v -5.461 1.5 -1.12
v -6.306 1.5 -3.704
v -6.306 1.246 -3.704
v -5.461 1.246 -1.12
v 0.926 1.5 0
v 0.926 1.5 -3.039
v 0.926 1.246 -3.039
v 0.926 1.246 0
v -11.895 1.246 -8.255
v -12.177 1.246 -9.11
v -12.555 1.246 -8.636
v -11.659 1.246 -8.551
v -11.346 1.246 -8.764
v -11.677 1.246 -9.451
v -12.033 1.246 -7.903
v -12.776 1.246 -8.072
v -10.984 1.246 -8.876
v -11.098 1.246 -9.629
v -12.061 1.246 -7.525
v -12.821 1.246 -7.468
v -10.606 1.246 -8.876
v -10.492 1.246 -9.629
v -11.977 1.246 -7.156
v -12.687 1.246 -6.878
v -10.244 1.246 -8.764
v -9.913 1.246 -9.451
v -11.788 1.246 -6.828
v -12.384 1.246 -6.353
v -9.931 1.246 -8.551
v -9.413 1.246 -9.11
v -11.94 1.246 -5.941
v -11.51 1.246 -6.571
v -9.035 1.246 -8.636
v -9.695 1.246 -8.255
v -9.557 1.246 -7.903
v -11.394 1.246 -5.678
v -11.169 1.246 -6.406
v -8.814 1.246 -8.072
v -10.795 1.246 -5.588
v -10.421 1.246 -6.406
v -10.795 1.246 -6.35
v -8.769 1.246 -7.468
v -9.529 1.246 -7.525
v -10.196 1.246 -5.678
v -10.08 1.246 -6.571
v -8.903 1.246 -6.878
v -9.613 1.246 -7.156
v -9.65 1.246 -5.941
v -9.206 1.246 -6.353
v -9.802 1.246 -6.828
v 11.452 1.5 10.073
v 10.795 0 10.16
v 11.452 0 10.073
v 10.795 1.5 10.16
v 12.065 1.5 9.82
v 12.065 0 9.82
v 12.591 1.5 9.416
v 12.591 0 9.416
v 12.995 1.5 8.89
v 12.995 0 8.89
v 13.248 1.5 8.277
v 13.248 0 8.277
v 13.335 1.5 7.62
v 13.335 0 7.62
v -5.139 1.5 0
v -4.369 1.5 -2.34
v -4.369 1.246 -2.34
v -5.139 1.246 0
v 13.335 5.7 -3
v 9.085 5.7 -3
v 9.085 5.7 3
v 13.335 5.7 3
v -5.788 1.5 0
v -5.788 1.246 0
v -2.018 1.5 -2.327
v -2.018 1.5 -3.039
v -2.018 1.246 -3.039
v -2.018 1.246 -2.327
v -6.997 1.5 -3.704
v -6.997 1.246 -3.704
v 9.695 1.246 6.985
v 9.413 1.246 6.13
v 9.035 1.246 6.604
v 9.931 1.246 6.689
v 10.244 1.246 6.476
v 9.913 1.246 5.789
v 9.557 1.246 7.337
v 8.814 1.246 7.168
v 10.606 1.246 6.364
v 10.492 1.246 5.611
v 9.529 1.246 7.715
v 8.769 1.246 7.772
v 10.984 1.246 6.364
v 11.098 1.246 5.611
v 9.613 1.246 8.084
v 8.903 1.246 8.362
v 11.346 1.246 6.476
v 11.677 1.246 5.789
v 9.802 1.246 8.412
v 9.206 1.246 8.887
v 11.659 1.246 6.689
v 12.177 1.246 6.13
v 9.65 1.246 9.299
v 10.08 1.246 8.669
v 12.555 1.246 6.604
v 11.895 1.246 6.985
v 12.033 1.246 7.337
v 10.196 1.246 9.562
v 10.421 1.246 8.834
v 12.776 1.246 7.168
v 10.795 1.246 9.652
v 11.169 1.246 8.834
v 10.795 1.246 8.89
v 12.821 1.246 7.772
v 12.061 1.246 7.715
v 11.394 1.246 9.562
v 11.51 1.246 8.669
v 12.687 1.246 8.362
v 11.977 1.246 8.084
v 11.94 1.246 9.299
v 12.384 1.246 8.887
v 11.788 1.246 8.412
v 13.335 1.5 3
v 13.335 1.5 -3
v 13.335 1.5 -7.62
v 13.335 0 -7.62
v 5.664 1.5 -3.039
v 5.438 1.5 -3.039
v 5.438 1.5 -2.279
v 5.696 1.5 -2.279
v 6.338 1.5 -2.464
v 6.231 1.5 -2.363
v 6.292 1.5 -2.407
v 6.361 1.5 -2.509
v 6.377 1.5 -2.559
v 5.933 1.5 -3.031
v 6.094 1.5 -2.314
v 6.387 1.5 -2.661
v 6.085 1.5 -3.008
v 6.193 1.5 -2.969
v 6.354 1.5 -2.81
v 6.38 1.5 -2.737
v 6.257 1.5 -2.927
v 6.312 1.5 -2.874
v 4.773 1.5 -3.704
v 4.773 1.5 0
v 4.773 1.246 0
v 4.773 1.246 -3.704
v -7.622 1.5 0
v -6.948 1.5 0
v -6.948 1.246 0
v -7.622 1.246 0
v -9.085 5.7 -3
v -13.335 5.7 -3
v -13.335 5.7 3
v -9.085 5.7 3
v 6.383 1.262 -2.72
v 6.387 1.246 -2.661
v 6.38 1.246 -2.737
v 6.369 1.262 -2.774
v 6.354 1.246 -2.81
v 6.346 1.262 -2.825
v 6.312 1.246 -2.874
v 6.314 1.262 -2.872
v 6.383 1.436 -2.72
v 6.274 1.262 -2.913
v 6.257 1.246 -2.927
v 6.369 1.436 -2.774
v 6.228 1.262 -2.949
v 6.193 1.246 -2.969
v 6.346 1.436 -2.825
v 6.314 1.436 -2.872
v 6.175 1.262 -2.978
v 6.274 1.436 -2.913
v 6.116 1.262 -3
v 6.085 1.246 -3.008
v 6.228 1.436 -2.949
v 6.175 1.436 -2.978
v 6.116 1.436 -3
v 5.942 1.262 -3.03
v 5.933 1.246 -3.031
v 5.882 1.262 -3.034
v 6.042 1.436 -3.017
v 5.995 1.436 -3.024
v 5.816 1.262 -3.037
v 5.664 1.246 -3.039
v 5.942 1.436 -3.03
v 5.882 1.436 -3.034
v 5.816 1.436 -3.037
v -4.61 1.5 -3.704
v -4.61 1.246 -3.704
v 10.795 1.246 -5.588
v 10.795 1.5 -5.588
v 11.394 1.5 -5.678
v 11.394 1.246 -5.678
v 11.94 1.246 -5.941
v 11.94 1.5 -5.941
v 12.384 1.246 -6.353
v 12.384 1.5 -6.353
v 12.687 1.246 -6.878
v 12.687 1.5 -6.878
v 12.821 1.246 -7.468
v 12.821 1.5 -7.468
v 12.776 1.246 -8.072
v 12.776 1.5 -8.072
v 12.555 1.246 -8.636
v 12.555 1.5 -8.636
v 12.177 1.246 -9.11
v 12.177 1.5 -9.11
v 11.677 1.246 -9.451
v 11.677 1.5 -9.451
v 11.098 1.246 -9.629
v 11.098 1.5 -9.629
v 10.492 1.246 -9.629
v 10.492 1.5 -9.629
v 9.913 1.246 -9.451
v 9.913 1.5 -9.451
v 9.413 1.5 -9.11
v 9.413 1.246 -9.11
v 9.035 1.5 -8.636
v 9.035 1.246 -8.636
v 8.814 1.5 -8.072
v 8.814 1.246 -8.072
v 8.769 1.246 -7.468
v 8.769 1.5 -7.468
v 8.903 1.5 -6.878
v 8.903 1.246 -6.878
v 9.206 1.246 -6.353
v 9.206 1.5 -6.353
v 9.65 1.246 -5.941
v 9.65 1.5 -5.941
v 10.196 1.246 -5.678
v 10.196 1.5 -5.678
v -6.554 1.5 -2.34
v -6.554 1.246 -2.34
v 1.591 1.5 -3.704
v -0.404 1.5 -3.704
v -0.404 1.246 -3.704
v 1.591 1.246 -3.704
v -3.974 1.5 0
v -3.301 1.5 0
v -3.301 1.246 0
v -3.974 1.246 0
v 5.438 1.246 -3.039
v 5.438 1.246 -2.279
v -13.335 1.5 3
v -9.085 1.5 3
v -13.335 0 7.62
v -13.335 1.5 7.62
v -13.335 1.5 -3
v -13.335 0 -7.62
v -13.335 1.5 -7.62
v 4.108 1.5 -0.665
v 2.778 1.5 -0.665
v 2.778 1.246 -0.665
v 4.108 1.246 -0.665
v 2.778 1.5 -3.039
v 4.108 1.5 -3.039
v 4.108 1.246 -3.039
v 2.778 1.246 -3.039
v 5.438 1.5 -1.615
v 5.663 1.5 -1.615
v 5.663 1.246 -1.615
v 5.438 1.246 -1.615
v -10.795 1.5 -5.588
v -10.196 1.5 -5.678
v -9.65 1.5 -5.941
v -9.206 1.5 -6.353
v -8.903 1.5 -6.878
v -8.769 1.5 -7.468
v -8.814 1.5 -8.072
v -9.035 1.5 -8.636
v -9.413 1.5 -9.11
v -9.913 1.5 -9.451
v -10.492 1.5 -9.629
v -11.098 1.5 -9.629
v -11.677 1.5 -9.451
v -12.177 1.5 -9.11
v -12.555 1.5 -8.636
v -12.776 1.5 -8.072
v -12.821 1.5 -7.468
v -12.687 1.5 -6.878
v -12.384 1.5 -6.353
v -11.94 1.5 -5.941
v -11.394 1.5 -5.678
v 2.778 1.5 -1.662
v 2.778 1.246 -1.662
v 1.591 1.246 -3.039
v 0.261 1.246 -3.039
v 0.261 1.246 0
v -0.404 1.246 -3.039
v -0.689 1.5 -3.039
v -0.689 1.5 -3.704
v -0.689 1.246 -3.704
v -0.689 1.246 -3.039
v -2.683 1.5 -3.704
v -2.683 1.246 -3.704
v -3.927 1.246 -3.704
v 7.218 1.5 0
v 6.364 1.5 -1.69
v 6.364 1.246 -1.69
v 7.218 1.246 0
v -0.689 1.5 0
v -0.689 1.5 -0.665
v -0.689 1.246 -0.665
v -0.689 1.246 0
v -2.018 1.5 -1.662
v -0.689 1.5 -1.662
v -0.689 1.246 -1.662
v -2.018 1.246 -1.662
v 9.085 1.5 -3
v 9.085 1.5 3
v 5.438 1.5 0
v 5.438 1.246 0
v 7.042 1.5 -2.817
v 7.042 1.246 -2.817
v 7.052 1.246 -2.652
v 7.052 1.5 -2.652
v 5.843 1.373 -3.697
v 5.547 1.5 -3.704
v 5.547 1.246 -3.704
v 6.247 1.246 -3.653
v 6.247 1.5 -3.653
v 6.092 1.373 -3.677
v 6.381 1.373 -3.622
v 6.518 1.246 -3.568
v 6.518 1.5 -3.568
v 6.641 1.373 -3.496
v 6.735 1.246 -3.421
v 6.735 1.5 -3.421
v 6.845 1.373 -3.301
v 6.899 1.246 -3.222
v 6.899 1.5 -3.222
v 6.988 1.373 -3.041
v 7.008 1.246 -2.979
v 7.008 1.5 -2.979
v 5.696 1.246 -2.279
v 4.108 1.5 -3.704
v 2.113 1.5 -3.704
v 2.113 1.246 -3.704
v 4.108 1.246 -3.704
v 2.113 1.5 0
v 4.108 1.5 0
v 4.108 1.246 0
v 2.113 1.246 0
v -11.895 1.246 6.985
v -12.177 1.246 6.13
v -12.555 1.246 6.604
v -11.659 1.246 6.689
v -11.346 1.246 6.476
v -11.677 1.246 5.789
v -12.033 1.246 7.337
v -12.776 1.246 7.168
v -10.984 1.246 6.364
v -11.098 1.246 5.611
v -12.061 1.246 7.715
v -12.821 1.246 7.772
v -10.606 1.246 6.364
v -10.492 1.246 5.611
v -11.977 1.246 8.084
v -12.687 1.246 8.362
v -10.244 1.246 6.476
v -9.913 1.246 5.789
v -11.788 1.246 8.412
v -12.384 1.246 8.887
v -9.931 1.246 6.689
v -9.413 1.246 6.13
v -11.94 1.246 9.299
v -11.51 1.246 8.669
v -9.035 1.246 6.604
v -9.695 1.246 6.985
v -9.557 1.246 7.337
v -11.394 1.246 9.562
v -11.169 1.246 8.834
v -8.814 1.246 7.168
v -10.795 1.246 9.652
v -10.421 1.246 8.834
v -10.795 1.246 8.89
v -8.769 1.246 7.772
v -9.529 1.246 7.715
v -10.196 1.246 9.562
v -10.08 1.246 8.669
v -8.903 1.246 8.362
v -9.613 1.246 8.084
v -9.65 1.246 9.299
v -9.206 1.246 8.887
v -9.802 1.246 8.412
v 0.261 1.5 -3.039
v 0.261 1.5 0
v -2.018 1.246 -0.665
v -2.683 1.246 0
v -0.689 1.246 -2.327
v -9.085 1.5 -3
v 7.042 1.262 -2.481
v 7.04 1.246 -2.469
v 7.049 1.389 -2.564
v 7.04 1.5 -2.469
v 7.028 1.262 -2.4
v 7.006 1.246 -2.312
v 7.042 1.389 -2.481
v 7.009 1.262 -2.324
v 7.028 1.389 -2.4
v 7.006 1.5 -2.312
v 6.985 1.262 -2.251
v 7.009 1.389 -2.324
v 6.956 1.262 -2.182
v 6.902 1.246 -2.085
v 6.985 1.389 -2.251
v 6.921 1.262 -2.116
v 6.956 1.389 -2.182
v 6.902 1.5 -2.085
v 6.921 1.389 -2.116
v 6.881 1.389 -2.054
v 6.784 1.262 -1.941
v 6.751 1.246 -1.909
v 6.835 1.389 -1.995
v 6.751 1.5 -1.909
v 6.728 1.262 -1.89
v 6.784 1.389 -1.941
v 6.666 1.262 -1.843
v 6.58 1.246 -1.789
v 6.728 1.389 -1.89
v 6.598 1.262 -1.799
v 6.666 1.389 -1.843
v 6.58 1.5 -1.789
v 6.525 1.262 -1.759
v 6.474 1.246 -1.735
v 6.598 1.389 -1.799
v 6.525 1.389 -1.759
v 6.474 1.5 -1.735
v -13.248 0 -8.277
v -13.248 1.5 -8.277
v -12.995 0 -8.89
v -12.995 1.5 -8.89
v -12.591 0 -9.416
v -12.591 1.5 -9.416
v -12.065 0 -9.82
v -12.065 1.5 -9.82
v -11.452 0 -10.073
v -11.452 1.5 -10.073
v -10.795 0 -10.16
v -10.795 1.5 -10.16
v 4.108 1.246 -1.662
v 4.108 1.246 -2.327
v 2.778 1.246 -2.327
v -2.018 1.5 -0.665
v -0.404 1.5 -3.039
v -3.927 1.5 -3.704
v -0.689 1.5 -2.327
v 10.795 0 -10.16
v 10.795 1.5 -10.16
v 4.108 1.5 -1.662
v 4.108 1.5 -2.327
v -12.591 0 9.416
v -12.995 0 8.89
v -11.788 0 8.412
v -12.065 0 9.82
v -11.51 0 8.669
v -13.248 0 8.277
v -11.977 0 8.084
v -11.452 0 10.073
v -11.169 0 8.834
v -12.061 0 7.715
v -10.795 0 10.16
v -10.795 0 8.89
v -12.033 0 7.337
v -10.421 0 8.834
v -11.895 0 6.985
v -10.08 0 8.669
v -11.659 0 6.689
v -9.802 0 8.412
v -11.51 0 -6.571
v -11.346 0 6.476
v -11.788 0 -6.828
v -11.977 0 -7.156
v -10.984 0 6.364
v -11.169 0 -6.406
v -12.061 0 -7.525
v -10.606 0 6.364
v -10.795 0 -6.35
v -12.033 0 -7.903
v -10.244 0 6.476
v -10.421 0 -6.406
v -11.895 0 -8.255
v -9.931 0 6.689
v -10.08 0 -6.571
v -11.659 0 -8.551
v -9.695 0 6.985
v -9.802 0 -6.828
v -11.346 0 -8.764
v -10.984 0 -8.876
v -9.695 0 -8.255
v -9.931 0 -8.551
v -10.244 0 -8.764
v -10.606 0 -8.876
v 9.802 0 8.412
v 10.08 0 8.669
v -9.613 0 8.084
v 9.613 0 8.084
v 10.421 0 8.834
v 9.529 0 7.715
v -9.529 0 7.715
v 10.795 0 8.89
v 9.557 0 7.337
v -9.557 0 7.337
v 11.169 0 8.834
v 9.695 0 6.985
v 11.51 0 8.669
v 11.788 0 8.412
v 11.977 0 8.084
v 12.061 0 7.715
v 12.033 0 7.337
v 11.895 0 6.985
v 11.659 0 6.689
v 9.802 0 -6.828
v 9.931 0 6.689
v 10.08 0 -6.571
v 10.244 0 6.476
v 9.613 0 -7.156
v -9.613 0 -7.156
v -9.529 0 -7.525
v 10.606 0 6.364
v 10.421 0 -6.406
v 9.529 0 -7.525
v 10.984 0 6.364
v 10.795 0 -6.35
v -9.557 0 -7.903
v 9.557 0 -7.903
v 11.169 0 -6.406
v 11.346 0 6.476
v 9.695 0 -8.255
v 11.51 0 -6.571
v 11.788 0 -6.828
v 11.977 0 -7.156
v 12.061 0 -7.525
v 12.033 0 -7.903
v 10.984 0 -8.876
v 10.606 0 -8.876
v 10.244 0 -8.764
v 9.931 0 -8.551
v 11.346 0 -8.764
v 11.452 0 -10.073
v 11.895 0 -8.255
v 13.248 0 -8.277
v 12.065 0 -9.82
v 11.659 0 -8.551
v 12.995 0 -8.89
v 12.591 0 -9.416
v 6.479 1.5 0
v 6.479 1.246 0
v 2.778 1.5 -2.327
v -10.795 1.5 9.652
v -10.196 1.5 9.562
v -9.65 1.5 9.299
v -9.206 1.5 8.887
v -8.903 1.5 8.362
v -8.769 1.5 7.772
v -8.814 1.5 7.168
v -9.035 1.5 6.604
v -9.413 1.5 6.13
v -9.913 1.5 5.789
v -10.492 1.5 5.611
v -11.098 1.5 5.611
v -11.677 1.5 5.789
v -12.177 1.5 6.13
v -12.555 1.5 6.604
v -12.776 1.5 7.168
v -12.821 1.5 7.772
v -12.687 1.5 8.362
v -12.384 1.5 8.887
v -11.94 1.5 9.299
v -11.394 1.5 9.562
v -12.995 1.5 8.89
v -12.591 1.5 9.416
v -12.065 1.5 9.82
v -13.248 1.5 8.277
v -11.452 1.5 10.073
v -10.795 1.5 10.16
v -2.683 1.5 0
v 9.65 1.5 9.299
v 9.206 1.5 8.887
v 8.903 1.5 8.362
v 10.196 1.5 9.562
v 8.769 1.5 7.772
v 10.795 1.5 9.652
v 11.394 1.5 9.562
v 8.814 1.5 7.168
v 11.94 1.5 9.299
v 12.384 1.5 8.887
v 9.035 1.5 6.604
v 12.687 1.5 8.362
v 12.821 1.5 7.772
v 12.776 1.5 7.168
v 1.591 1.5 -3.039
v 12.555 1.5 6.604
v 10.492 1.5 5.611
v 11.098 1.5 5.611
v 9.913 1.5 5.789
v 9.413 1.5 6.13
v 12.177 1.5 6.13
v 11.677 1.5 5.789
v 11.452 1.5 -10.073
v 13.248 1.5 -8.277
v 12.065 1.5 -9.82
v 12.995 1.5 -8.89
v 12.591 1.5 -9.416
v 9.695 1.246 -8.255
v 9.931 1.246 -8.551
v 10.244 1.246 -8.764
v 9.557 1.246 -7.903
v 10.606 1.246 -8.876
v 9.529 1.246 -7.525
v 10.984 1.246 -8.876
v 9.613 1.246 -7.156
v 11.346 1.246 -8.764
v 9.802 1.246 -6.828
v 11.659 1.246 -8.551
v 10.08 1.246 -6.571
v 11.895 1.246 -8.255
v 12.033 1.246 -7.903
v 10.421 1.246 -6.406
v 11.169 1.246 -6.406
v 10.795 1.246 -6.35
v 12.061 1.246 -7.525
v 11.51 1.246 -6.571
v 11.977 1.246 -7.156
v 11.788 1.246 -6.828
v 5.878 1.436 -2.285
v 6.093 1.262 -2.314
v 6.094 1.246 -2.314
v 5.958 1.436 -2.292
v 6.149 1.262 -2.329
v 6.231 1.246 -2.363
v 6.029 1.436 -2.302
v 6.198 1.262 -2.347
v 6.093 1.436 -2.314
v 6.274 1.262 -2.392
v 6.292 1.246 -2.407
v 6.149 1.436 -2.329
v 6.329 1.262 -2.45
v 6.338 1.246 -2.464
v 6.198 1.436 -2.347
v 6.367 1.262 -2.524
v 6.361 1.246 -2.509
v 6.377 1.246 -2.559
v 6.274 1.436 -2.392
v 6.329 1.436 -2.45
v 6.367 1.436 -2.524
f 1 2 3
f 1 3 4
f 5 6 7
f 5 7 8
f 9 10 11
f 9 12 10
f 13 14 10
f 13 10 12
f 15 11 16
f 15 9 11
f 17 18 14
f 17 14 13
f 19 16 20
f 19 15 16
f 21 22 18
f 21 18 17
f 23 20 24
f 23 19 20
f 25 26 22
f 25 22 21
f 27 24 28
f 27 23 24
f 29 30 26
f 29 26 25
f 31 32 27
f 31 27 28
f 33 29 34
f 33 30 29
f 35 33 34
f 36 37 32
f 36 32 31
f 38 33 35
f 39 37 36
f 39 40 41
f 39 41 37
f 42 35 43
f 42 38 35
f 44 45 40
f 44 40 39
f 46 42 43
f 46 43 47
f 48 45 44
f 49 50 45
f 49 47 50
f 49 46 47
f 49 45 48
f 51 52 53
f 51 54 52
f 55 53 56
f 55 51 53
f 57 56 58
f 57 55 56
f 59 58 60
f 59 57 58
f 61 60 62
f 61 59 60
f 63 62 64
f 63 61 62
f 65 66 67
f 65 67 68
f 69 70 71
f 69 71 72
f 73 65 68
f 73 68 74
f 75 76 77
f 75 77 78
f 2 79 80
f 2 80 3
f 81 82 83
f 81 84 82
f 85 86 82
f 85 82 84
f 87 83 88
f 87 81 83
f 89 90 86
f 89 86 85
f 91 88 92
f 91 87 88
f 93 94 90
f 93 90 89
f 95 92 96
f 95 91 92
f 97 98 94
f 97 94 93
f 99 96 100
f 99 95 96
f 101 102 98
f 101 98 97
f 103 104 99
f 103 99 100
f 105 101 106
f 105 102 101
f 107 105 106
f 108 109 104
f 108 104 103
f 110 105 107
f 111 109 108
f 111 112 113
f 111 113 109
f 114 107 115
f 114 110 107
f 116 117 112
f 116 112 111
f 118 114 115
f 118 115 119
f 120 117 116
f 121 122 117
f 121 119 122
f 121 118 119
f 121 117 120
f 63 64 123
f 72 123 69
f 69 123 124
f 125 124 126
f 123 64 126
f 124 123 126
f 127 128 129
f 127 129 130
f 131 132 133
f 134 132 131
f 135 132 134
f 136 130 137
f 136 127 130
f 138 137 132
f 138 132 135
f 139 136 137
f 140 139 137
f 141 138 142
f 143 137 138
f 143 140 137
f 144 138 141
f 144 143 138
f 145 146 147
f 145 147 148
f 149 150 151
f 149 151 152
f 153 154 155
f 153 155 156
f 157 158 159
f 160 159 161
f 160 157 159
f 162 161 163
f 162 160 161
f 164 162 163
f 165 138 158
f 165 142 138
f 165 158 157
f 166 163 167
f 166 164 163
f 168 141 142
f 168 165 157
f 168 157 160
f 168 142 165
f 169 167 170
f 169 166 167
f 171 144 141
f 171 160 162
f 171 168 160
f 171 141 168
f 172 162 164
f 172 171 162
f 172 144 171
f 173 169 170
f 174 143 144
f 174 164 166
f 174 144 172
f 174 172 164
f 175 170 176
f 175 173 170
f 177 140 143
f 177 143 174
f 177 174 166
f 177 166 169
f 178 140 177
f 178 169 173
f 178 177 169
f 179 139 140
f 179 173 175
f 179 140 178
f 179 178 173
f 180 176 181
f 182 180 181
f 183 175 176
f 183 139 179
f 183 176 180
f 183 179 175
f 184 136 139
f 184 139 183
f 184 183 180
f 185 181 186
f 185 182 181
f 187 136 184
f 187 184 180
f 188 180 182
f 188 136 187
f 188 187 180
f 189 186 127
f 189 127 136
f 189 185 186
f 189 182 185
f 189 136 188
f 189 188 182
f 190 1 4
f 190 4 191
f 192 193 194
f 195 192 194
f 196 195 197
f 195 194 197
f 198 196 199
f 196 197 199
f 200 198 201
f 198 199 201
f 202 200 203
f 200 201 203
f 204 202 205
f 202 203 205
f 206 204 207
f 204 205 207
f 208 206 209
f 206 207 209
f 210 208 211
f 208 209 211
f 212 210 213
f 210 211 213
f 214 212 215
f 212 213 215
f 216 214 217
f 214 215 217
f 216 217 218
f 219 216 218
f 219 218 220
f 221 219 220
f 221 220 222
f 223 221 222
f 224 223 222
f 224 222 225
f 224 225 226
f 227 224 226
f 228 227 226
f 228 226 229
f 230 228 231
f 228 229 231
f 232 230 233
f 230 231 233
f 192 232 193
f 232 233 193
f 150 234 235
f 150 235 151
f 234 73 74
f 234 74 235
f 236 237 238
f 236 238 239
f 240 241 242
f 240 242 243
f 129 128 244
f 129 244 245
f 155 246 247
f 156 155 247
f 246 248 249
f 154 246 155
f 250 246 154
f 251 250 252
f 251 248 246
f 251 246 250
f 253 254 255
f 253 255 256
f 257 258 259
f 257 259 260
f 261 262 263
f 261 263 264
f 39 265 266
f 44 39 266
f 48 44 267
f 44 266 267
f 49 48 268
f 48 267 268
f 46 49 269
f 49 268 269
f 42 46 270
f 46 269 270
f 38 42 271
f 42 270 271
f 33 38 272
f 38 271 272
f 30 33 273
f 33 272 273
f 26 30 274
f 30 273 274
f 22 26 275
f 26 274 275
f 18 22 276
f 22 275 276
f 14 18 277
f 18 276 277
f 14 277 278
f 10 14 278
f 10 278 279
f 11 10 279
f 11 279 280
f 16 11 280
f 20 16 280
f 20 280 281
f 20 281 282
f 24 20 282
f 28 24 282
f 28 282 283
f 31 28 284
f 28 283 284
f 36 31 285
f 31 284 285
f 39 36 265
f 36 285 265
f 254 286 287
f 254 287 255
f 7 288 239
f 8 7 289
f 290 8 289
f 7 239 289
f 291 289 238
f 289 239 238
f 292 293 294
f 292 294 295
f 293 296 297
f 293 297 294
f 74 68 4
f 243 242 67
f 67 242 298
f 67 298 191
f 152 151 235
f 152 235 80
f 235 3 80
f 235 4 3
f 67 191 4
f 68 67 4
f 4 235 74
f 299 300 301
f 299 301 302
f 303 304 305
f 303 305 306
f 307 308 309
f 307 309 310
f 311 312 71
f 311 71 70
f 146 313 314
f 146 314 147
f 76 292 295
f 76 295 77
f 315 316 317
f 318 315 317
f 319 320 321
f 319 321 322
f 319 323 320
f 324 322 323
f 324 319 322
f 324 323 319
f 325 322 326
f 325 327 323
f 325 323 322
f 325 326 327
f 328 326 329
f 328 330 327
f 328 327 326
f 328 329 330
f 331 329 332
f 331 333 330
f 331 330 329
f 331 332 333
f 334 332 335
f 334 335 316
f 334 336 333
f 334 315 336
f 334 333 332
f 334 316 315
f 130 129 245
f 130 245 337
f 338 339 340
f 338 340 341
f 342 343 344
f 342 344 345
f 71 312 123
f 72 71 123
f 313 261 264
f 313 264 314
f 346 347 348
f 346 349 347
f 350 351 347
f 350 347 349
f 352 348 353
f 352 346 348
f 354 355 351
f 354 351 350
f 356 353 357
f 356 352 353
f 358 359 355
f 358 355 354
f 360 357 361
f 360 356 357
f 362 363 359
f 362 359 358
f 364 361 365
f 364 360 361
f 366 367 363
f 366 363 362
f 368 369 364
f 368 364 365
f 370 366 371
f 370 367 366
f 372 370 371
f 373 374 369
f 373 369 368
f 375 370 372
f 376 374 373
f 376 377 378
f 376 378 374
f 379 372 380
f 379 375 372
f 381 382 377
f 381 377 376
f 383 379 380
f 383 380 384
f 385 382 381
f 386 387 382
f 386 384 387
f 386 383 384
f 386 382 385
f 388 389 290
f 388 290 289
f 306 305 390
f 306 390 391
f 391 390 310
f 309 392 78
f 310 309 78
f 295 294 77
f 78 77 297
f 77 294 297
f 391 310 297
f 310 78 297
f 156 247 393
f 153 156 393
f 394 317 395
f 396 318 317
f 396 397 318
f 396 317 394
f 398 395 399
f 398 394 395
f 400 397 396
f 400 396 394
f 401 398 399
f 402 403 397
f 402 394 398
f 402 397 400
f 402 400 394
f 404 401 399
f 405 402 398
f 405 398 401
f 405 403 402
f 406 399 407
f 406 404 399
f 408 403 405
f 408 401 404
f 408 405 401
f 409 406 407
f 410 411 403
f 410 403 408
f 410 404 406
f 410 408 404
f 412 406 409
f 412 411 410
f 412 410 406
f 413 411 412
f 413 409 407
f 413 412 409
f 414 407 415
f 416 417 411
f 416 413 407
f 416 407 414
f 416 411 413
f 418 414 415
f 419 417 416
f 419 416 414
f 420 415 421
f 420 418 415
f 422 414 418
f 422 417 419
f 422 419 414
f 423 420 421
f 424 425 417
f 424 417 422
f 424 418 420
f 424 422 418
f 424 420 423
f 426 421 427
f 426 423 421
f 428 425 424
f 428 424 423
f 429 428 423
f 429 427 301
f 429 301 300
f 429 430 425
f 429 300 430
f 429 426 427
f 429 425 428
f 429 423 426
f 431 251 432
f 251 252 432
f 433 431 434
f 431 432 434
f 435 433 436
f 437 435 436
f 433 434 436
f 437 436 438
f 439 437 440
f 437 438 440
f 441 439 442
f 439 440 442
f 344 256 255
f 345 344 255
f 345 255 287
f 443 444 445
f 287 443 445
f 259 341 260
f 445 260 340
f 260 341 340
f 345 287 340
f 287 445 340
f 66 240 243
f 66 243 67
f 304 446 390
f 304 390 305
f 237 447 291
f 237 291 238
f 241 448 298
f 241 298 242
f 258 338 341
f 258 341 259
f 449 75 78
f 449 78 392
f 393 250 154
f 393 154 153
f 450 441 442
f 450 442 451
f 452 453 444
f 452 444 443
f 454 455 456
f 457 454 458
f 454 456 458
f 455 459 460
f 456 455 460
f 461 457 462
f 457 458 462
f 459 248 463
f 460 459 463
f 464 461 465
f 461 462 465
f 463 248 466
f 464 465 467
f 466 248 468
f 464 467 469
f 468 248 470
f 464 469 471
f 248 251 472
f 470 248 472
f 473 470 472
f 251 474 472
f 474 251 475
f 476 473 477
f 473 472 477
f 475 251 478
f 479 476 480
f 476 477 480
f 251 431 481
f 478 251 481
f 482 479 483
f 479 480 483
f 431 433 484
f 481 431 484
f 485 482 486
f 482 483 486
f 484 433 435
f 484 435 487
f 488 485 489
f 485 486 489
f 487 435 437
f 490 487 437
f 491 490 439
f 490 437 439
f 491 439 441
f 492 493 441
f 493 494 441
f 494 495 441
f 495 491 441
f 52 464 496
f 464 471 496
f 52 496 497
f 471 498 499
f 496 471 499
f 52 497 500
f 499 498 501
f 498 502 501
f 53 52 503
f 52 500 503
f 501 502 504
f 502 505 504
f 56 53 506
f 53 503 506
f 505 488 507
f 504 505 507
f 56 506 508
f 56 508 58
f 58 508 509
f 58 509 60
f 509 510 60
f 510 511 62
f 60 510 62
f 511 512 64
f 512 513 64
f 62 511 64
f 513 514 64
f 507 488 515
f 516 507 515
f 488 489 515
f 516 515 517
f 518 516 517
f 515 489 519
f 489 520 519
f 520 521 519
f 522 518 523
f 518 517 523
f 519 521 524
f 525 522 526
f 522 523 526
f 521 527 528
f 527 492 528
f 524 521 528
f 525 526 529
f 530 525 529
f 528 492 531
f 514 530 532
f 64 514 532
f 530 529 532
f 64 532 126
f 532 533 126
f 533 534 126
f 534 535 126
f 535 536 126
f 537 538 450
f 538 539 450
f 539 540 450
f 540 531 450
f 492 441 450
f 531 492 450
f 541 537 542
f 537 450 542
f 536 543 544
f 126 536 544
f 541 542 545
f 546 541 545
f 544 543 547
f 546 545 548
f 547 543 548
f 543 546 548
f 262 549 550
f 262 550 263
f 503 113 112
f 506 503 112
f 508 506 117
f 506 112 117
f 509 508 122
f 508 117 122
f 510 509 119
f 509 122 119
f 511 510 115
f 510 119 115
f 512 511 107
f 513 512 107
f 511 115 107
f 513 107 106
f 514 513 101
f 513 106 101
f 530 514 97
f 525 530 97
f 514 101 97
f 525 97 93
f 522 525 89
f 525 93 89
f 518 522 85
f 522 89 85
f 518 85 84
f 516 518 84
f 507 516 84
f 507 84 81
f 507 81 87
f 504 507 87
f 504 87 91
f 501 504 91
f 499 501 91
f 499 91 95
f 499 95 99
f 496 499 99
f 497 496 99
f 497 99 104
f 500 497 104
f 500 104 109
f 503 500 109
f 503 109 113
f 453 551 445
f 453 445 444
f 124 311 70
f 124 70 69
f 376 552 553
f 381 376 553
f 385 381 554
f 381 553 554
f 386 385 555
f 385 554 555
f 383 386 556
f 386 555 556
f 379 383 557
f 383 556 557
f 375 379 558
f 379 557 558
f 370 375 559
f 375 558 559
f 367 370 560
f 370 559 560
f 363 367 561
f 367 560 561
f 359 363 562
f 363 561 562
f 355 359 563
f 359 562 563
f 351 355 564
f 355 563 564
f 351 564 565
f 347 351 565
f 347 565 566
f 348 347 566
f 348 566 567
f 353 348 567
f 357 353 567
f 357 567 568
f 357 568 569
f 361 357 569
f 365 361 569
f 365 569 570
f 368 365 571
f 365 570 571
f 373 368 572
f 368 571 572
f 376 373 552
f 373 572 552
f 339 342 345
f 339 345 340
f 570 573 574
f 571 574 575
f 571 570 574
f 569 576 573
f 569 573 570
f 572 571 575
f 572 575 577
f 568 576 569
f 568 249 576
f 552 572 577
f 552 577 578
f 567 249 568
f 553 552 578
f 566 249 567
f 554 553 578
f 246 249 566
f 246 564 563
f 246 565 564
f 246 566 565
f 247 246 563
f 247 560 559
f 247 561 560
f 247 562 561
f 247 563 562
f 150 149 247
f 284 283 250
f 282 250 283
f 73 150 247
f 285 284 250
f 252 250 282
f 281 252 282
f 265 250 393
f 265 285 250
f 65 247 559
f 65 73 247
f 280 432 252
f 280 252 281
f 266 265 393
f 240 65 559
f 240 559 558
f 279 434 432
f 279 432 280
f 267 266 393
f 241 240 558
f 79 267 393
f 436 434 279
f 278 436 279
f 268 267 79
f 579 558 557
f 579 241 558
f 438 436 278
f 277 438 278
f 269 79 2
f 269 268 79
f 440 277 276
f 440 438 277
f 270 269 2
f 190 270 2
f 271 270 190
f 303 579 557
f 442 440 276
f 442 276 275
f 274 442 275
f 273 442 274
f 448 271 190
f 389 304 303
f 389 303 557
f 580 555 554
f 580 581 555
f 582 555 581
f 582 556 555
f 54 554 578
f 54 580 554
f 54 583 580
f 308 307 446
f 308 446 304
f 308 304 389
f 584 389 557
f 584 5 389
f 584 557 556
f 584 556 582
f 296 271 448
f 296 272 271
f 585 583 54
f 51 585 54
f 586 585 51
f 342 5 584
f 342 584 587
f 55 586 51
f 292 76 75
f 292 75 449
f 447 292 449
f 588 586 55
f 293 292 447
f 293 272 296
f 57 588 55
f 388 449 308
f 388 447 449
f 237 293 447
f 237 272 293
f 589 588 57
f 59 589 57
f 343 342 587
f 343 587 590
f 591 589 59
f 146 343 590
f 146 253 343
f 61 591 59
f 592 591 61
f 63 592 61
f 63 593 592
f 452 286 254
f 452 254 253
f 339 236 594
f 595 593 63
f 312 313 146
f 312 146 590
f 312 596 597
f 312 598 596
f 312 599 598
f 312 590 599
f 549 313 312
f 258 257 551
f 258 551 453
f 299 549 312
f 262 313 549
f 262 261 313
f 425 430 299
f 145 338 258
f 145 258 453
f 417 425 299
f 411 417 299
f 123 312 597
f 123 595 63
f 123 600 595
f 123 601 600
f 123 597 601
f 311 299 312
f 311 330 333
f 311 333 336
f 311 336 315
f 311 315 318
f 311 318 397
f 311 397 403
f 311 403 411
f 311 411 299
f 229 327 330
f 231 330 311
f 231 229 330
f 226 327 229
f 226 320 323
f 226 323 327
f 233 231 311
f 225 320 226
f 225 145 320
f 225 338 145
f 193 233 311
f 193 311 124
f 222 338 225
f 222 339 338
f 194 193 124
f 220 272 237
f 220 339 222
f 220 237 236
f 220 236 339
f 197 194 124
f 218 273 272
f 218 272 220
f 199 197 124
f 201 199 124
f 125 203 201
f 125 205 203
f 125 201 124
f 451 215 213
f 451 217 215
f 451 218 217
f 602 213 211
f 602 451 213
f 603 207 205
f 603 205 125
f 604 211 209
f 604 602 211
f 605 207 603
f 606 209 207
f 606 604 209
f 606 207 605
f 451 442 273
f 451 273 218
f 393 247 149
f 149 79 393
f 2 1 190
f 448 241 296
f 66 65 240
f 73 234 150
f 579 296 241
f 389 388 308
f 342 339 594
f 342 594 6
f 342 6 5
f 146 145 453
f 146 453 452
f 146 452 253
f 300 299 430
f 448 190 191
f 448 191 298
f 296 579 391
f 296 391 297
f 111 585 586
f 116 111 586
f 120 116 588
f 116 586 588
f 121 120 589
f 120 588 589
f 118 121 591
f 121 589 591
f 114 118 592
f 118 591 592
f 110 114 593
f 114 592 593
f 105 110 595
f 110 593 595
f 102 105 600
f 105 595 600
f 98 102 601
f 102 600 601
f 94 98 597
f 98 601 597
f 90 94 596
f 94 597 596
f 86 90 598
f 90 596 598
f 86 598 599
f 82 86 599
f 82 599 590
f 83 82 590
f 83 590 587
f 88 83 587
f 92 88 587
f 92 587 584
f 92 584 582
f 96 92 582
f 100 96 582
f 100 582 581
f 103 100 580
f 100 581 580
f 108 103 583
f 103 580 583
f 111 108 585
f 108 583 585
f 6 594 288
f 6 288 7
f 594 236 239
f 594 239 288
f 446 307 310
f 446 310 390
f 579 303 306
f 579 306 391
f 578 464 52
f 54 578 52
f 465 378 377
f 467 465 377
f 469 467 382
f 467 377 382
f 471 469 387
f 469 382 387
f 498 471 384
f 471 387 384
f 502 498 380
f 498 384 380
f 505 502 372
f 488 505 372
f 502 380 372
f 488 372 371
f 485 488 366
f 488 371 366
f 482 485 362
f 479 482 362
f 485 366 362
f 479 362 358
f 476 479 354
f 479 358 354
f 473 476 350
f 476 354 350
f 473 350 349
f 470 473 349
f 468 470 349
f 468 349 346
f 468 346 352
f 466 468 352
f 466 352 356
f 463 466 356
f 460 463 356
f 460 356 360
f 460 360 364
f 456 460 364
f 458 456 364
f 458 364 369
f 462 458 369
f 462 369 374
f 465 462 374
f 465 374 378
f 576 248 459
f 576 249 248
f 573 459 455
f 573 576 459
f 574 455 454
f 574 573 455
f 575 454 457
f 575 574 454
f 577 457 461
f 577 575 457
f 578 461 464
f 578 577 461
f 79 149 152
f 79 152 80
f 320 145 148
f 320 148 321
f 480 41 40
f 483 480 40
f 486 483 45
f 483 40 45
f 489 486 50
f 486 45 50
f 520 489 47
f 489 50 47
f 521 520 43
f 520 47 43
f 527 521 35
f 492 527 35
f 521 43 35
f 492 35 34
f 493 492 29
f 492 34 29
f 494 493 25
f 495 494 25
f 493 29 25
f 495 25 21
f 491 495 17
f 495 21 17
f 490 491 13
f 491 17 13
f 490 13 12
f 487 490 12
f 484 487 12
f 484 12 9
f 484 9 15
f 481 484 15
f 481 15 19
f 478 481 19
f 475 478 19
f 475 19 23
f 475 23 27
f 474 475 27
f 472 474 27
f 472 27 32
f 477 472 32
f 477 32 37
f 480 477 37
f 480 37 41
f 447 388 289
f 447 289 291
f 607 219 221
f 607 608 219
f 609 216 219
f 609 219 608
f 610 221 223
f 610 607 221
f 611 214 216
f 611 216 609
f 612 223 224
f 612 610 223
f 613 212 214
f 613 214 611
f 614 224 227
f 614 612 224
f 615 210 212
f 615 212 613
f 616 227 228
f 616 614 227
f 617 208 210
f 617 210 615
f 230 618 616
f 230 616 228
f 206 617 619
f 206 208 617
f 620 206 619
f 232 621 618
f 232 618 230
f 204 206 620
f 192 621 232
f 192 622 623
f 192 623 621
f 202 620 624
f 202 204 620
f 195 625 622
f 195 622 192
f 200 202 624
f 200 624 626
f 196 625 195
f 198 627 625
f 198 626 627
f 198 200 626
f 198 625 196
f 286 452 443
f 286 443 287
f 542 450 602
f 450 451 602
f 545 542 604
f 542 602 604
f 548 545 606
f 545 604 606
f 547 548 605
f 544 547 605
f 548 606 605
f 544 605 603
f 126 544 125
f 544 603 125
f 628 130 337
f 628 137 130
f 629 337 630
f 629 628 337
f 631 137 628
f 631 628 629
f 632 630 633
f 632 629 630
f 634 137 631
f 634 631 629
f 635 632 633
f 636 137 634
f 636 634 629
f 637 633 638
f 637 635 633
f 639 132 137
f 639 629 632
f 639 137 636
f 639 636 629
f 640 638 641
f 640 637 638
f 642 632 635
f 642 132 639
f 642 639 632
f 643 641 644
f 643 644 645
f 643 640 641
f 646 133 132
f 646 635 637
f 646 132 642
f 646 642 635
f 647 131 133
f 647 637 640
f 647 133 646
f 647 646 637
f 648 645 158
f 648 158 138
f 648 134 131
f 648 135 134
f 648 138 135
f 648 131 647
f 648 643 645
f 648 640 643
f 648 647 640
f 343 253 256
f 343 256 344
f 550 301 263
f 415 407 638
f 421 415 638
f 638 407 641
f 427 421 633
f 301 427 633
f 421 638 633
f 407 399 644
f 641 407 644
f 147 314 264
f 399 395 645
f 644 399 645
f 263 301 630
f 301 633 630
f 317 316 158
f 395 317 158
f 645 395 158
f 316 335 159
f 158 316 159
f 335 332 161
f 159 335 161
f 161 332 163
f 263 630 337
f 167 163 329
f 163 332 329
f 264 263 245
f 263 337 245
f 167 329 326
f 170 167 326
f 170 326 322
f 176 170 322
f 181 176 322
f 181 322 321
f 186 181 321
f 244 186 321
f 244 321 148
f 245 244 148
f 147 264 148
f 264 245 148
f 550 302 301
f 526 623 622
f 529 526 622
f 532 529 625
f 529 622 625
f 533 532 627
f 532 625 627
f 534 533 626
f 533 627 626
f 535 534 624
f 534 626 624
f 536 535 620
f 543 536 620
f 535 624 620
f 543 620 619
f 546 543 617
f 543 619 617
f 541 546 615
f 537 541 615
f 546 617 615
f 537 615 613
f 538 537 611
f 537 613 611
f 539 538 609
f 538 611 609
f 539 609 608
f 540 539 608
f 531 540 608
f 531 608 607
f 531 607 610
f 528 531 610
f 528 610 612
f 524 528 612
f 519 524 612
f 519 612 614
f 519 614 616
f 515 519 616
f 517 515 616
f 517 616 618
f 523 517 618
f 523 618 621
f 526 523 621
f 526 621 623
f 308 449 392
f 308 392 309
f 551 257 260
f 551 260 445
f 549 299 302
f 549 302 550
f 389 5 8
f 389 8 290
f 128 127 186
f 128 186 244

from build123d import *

# Parameters (mm, degrees)
SKETCH1_W           = 26.67
SKETCH1_H           = 20.32
BOSS_EXTRUDE1_DEPTH = 1.5
SKETCH2_R           = 1.27
CUT_EXTRUDE1_DEPTH  = 17.831453443
FILLET1_R           = 2.54
CUT_EXTRUDE2_DEPTH  = 0.254
SKETCH4_R           = 2.032
SKETCH4_R_2         = 1.27
CUT_EXTRUDE3_DEPTH  = 0.254
SKETCH5_W           = 4.25
SKETCH5_H           = 6
BOSS_EXTRUDE3_DEPTH = 4.2


with BuildPart() as part:
    # Sketch1 → Boss-Extrude1 (new body)
    with BuildSketch(Plane(origin=(0, 0, 0), x_dir=(1, 0, 0), z_dir=(0, 1, 0))):
        Rectangle(SKETCH1_W, SKETCH1_H)
    extrude(amount=BOSS_EXTRUDE1_DEPTH)

    # Sketch2 → Cut-Extrude1 (cut, through all)
    with BuildSketch(Plane(origin=(0, 1.5, 0), x_dir=(1, 0, 0), z_dir=(0, 1, 0))):
        with Locations(Location((10.795, 7.62, 0), (0, 0, 270))):
            Circle(SKETCH2_R)
        with Locations(Location((-10.795, 7.62, 0), (0, 0, 270))):
            Circle(SKETCH2_R)
        with Locations(Location((-10.795, -7.62, 0), (0, 0, 270))):
            Circle(SKETCH2_R)
        with Locations(Location((10.795, -7.62, 0), (0, 0, 270))):
            Circle(SKETCH2_R)
    extrude(amount=-CUT_EXTRUDE1_DEPTH, mode=Mode.SUBTRACT)

    # Fillet1
    fillet1_edges = [part.edges().sort_by_distance(p)[0] for p in [
        (13.335, 0.75, 10.16),
        (-13.335, 0.75, 10.16),
        (-13.335, 0.75, -10.16),
        (13.335, 0.75, -10.16),
    ]]
    fillet(fillet1_edges, radius=FILLET1_R)

    # Sketch3 → Cut-Extrude2 (cut)
    # profile 1 of 5: a face of its own
    with BuildSketch(Plane(origin=(0, 1.5, 0), x_dir=(1, 0, 0), z_dir=(0, 1, 0))):
        Polygon((-6.996511919, 3.704166667), (-6.306432792, 3.704166667), (-5.461271368, 1.120451055), (-4.610173778, 3.704166667), (-3.926772837, 3.704166667), (-3.300507479, 0), (-3.973520132, 0), (-4.369017094, 2.339590845), (-5.139234442, 0), (-5.787760417, 0), (-6.553525641, 2.339590845), (-6.948280582, 0), (-7.622035256, 0), align=None)
    # profile 2 of 5: a face of its own
    with BuildSketch(Plane(origin=(0, 1.5, 0), x_dir=(1, 0, 0), z_dir=(0, 1, 0))):
        Polygon((-2.683146368, 3.704166667), (-0.688595085, 3.704166667), (-0.688595085, 3.039316239), (-2.01829594, 3.039316239), (-2.01829594, 2.326976496), (-0.688595085, 2.326976496), (-0.688595085, 1.662126068), (-2.01829594, 1.662126068), (-2.01829594, 0.664850427), (-0.688595085, 0.664850427), (-0.688595085, 0), (-2.683146368, 0), align=None)
    # profile 3 of 5: a face of its own
    with BuildSketch(Plane(origin=(0, 1.5, 0), x_dir=(1, 0, 0), z_dir=(0, 1, 0))):
        Polygon((-0.403659188, 3.704166667), (1.590892094, 3.704166667), (1.590892094, 3.039316239), (0.926041667, 3.039316239), (0.926041667, 0), (0.261191239, 0), (0.261191239, 3.039316239), (-0.403659188, 3.039316239), align=None)
    # profile 4 of 5: a face of its own
    with BuildSketch(Plane(origin=(0, 1.5, 0), x_dir=(1, 0, 0), z_dir=(0, 1, 0))):
        Polygon((2.113274573, 3.704166667), (4.107825855, 3.704166667), (4.107825855, 3.039316239), (2.778125, 3.039316239), (2.778125, 2.326976496), (4.107825855, 2.326976496), (4.107825855, 1.662126068), (2.778125, 1.662126068), (2.778125, 0.664850427), (4.107825855, 0.664850427), (4.107825855, 0), (2.113274573, 0), align=None)
    # profile 5 of 5: a face of its own
    with BuildSketch(Plane(origin=(0, 1.5, 0), x_dir=(1, 0, 0), z_dir=(0, 1, 0))):
        with BuildLine():
            Line((4.772676282, 3.704166667), (5.547345753, 3.704166667))
            add(Edge.make_bspline(
                [(5.547345753, 3.704166667), (5.598551169, 3.703984917), (5.697033609, 3.703635361), (5.839039907, 3.698120291), (5.969492221, 3.690445618), (6.088583697, 3.678733864), (6.196263387, 3.663205494), (6.292639209, 3.644900116), (6.377708347, 3.624037212), (6.452188242, 3.598040388), (6.519402665, 3.568716365), (6.582055851, 3.535022525), (6.641530024, 3.497334059), (6.697427662, 3.454659282), (6.75023453, 3.407765903), (6.800050251, 3.356606718), (6.846170881, 3.30074792), (6.888310842, 3.240542464), (6.926718023, 3.177207705), (6.960661917, 3.110656684), (6.988265147, 3.040843118), (7.01265556, 2.968775966), (7.030223185, 2.893425013), (7.04244121, 2.815523813), (7.051386771, 2.734798146), (7.051901098, 2.679956711), (7.052163462, 2.651981504)],
                knots=[0, 0, 0, 0, 1.749336639, 3.364467119, 4.854658419, 6.213483162, 7.451590619, 8.570285859, 9.5643256, 10.440900261, 11.26203566, 12.067320669, 12.869050712, 13.665104639, 14.467235401, 15.27997916, 16.102287765, 16.939272006, 17.78853747, 18.631303466, 19.488103222, 20.351255419, 21.228522269, 22.127379805, 23.044756219, 24, 24, 24, 24], degree=3))
            add(Edge.make_bspline(
                [(7.052163462, 2.651981504), (7.051481935, 2.622781813), (7.050145585, 2.565526543), (7.04294728, 2.481423219), (7.029791039, 2.400959043), (7.009863997, 2.324369601), (6.986960451, 2.250701651), (6.95650461, 2.18131441), (6.922132184, 2.115198744), (6.881309057, 2.053289882), (6.83650767, 1.994212705), (6.784404599, 1.940230679), (6.728375323, 1.888442475), (6.665270232, 1.842091929), (6.597871057, 1.798044986), (6.524838649, 1.758126726), (6.44664964, 1.721333695), (6.391678895, 1.700815359), (6.363568376, 1.69032285)],
                knots=[0, 0, 0, 0, 1.099860209, 2.156625411, 3.176576793, 4.16617041, 5.135385252, 6.078461593, 7.016046972, 7.938469504, 8.868247731, 9.803980173, 10.76021508, 11.73834243, 12.748633912, 13.790971185, 14.870363756, 16, 16, 16, 16], degree=3))
            Line((6.363568376, 1.69032285), (7.218376068, 0))
            Line((7.218376068, 0), (6.479323584, 0))
            Line((6.479323584, 0), (5.663100962, 1.614636752))
            Line((5.663100962, 1.614636752), (5.437526709, 1.614636752))
            Line((5.437526709, 1.614636752), (5.437526709, 0))
            Line((5.437526709, 0), (4.772676282, 0))
            Line((4.772676282, 0), (4.772676282, 3.704166667))
        make_face()
        with BuildLine():
            Line((5.437526709, 2.279487179), (5.696491887, 2.279487179))
            add(Edge.make_bspline(
                [(5.696491887, 2.279487179), (5.728152533, 2.279843763), (5.788775866, 2.280526544), (5.875960182, 2.283693564), (5.955144333, 2.291324517), (6.026668362, 2.300965941), (6.090892173, 2.312098358), (6.147242912, 2.328051787), (6.196588856, 2.34514629), (6.238345256, 2.366390323), (6.274020965, 2.390549396), (6.304824656, 2.417994704), (6.330303725, 2.449759153), (6.351274298, 2.484979522), (6.367587124, 2.523967328), (6.379494238, 2.566294572), (6.386148553, 2.612443416), (6.386914155, 2.644292402), (6.387313034, 2.660885751)],
                knots=[0, 0, 0, 0, 1.688639943, 3.233382647, 4.650958383, 5.928841754, 7.082724185, 8.122798841, 9.049171256, 9.863274652, 10.613301712, 11.341792392, 12.054588806, 12.776240173, 13.521029143, 14.301969904, 15.115324896, 16, 16, 16, 16], degree=3))
            add(Edge.make_bspline(
                [(6.387313034, 2.660885751), (6.386558917, 2.680516893), (6.385077593, 2.719078635), (6.370378255, 2.774594022), (6.346980086, 2.825977311), (6.314907604, 2.872996339), (6.274516483, 2.914216465), (6.228164484, 2.950552334), (6.174851221, 2.979284021), (6.125487151, 2.998235136), (6.080577385, 3.009573783), (6.040047739, 3.018023243), (5.993114165, 3.024011617), (5.93974123, 3.030363355), (5.880064984, 3.034482135), (5.813760155, 3.037488023), (5.741017172, 3.03871788), (5.690308404, 3.039111043), (5.663842982, 3.039316239)],
                knots=[0, 0, 0, 0, 1.020303359, 2.004196876, 2.966617323, 3.9489082, 4.950758222, 5.960522915, 7.003732012, 8.091992268, 8.70421221, 9.413913587, 10.24622431, 11.166358409, 12.212345909, 13.359657661, 14.621978493, 16, 16, 16, 16], degree=3))
            Line((5.663842982, 3.039316239), (5.437526709, 3.039316239))
            Line((5.437526709, 3.039316239), (5.437526709, 2.279487179))
        make_face(mode=Mode.SUBTRACT)
    extrude(amount=-CUT_EXTRUDE2_DEPTH, mode=Mode.SUBTRACT)

    # Sketch4 → Cut-Extrude3 (cut)
    # profile 1 of 4: a face of its own
    with BuildSketch(Plane(origin=(0, 1.5, 0), x_dir=(1, 0, 0), z_dir=(0, 1, 0))):
        with Locations(Location((-10.795, 7.62, 0), (0, 0, 270))):
            Circle(SKETCH4_R)
        with Locations(Location((-10.795, 7.62, 0), (0, 0, 270))):
            Circle(SKETCH4_R_2, mode=Mode.SUBTRACT)
    # profile 2 of 4: a face of its own
    with BuildSketch(Plane(origin=(0, 1.5, 0), x_dir=(1, 0, 0), z_dir=(0, 1, 0))):
        with Locations(Location((10.795, 7.62, 0), (0, 0, 270))):
            Circle(SKETCH4_R)
        with Locations(Location((10.795, 7.62, 0), (0, 0, 270))):
            Circle(SKETCH4_R_2, mode=Mode.SUBTRACT)
    # profile 3 of 4: a face of its own
    with BuildSketch(Plane(origin=(0, 1.5, 0), x_dir=(1, 0, 0), z_dir=(0, 1, 0))):
        with Locations(Location((10.795, -7.62, 0), (0, 0, 270))):
            Circle(SKETCH4_R)
        with Locations(Location((10.795, -7.62, 0), (0, 0, 270))):
            Circle(SKETCH4_R_2, mode=Mode.SUBTRACT)
    # profile 4 of 4: a face of its own
    with BuildSketch(Plane(origin=(0, 1.5, 0), x_dir=(1, 0, 0), z_dir=(0, 1, 0))):
        with Locations(Location((-10.795, -7.62, 0), (0, 0, 270))):
            Circle(SKETCH4_R)
        with Locations(Location((-10.795, -7.62, 0), (0, 0, 270))):
            Circle(SKETCH4_R_2, mode=Mode.SUBTRACT)
    extrude(amount=-CUT_EXTRUDE3_DEPTH, mode=Mode.SUBTRACT)

    # Sketch5 → Boss-Extrude3 (add)
    with BuildSketch(Plane(origin=(0, 1.5, 0), x_dir=(1, 0, 0), z_dir=(0, 1, 0))):
        with Locations((-11.21, 0)):
            Rectangle(SKETCH5_W, SKETCH5_H)
        with Locations((11.21, 0)):
            Rectangle(SKETCH5_W, SKETCH5_H)
    extrude(amount=BOSS_EXTRUDE3_DEPTH)


solid = part.part
